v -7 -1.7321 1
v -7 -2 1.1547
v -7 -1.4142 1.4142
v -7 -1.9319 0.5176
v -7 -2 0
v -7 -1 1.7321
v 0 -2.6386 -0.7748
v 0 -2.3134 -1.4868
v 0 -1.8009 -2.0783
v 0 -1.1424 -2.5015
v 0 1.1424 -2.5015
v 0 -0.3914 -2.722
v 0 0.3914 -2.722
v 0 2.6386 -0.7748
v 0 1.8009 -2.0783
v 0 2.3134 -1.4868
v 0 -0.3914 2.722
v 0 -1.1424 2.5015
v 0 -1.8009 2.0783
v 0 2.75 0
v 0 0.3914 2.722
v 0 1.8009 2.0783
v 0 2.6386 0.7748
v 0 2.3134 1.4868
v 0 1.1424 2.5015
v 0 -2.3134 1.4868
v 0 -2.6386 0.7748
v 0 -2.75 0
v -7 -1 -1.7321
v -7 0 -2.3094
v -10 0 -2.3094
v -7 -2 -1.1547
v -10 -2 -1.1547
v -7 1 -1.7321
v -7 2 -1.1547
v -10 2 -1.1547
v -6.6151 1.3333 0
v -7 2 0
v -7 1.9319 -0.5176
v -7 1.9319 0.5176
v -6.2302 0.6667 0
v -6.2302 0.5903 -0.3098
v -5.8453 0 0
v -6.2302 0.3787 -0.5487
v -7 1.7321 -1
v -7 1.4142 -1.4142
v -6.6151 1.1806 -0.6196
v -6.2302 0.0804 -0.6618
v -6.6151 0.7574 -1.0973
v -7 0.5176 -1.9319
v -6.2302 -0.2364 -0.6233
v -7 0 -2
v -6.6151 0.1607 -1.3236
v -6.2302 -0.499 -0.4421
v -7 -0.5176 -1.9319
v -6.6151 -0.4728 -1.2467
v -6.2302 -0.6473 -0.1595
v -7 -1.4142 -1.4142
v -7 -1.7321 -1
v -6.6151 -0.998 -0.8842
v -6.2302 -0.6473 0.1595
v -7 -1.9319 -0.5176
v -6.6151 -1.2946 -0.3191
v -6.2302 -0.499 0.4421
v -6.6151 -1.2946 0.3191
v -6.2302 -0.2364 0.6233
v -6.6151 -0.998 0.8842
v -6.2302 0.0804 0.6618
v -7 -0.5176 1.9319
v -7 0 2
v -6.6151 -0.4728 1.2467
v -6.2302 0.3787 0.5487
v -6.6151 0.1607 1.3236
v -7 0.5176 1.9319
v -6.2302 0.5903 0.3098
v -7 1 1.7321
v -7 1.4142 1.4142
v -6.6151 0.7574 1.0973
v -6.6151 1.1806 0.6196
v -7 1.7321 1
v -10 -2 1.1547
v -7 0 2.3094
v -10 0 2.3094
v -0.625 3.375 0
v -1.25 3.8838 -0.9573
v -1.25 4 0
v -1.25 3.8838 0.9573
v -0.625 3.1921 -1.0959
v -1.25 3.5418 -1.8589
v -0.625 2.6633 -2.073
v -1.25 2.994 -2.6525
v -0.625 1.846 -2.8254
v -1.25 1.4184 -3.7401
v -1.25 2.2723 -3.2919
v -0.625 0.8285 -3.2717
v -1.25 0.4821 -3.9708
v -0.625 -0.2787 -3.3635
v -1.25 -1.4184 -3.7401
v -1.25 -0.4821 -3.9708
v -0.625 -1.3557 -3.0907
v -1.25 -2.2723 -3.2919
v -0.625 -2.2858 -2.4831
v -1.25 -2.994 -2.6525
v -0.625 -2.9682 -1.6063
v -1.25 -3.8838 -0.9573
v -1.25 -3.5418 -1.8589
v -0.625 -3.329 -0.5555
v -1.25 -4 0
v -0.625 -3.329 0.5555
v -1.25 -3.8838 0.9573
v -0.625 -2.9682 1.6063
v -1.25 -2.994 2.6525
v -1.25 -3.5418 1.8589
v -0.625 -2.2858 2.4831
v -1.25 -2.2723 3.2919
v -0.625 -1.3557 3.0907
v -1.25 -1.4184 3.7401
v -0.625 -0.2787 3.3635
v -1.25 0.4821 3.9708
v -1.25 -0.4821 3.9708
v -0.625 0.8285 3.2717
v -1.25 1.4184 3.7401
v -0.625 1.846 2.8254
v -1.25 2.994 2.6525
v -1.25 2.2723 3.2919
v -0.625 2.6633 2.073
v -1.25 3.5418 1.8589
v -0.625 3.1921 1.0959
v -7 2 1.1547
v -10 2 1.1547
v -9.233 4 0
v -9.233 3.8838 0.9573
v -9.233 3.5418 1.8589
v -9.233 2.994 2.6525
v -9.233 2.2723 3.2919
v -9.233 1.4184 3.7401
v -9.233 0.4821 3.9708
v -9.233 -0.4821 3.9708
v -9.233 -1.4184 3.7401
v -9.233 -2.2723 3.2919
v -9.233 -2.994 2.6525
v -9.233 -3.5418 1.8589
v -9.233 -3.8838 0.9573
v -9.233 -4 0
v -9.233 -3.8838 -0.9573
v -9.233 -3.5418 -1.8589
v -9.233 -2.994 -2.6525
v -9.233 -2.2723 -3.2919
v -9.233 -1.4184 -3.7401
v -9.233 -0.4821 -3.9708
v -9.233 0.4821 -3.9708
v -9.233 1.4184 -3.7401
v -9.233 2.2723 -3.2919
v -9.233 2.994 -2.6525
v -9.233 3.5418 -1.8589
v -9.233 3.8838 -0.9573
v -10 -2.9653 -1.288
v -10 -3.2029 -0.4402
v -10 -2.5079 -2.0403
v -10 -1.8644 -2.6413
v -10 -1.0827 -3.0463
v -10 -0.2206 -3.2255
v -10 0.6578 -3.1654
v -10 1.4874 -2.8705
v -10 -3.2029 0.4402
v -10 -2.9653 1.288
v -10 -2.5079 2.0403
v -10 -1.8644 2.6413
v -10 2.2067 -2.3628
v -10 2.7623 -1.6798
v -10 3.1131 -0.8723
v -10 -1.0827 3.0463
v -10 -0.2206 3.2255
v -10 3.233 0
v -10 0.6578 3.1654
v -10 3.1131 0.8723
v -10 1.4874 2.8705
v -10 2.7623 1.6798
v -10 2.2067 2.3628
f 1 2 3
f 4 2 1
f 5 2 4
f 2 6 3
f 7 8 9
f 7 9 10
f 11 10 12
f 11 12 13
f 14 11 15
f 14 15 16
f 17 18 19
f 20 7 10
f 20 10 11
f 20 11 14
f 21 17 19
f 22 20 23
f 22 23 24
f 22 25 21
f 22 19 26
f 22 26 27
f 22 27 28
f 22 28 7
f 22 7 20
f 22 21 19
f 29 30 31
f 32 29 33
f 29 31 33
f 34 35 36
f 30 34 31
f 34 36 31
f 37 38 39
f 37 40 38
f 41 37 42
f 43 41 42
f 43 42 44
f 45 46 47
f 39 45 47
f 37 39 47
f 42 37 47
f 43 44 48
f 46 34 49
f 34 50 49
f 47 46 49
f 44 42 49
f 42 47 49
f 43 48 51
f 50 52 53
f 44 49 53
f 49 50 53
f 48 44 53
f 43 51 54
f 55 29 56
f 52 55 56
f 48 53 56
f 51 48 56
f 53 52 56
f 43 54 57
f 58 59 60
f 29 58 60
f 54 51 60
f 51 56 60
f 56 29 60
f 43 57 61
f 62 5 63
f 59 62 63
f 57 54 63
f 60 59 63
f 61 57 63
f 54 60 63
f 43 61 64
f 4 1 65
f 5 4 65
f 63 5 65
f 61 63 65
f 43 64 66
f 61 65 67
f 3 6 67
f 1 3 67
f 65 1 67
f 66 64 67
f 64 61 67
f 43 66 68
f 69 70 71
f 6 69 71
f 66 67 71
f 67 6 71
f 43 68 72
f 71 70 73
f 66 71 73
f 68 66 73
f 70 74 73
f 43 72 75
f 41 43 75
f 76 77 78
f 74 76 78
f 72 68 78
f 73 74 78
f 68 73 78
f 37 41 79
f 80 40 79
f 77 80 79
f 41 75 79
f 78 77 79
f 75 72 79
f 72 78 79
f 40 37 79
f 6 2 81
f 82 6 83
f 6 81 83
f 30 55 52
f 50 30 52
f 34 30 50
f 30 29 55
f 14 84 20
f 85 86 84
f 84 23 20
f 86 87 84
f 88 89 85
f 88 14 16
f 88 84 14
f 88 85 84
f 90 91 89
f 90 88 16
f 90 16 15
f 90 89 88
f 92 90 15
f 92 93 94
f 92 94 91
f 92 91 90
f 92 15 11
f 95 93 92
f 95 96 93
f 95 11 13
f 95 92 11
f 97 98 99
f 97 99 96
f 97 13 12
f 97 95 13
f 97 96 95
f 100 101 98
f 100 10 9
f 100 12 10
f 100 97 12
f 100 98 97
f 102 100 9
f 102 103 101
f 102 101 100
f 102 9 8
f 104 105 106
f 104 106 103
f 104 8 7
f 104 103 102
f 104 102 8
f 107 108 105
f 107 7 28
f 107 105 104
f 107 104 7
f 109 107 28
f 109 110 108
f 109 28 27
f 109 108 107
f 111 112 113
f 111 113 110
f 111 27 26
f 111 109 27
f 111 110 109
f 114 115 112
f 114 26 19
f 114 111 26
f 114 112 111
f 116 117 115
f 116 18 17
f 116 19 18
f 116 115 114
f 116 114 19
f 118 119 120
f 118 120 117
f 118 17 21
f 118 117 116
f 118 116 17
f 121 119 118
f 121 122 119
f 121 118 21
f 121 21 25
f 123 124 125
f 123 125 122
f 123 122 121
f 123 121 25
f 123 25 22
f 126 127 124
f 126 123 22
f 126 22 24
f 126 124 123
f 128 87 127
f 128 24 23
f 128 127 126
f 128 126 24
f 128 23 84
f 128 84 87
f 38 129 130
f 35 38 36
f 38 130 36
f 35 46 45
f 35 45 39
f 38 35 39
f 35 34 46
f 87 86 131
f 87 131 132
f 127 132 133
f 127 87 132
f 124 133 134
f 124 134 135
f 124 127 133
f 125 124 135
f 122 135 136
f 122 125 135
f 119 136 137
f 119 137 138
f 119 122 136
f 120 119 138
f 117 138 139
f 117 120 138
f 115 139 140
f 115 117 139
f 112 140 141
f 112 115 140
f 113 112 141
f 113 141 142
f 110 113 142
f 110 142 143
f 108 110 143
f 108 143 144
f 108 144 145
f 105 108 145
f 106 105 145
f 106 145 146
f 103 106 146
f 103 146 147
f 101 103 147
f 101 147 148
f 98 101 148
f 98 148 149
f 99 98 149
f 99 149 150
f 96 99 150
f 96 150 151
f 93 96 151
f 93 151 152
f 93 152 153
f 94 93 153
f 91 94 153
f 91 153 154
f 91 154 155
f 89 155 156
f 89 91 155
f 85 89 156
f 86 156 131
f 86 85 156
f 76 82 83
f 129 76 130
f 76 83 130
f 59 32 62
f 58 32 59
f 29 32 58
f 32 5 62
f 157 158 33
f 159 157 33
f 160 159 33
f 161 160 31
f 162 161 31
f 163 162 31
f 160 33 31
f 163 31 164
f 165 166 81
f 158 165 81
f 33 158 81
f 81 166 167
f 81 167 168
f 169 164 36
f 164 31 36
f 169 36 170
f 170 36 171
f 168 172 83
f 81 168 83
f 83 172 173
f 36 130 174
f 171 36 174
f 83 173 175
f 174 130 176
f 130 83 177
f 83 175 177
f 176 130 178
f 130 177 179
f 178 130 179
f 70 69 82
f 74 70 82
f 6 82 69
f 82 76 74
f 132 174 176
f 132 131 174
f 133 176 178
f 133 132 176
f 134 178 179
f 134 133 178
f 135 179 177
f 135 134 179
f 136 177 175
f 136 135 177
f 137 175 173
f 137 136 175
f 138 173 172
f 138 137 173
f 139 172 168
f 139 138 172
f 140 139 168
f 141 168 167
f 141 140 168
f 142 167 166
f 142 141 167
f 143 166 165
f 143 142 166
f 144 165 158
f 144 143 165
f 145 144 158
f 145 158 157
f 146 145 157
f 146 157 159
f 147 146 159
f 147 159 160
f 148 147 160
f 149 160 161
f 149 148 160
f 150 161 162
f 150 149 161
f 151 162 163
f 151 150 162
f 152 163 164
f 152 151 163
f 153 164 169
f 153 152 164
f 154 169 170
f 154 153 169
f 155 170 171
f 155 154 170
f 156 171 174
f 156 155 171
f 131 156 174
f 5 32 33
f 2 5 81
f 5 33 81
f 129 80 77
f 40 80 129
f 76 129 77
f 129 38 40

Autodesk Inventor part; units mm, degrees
sketch "Sketch_1" plane through (0, 0, 0) normal (0, 0, 1) x (1, 0, 0)
  line L0 (0, 0) -> (-10, 0)
  line L1 (-10, 0) -> (-10, 3.233)
  line L2 (-10, 3.233) -> (-9.233, 4)
  line L3 (-9.233, 4) -> (-1.25, 4)
  line L4 (-1.25, 4) -> (0, 2.75)
  line L5 (0, 2.75) -> (0, 0)
  line L6 (0, 0) -> (-10, 0)
revolve "Revolution1" add sketch "Sketch_1" angle 360 about axis through (0, 0, 0) along (1, 0, 0)
thread "Thread1" size "M8x1.25" class "6g" standard "ISO Metric profile" full length
sketch "Sketch_2" plane through (-10, 0, 0) normal (-1, 0, 0) x (0, 1, 0)
  line L0 (-2, -1.1547) -> (0, -2.3094)
  line L1 (0, -2.3094) -> (2, -1.1547)
  line L2 (2, -1.1547) -> (2, 1.1547)
  line L3 (2, 1.1547) -> (0, 2.3094)
  line L4 (0, 2.3094) -> (-2, 1.1547)
  line L5 (-2, 1.1547) -> (-2, -1.1547)
extrude "Extrusion1" cut sketch "Sketch_2" against normal blind 3
sketch "Sketch_3" plane through (0, 0, 0) normal (0, 0, 1) x (1, 0, 0)
  line L0 (-5.8453, 0) -> (-7, 0)
  line L1 (-7, 0) -> (-7, 2)
  line L2 (-7, 2) -> (-5.8453, 0)
  line L3 (-5.8453, 0) -> (-7, 0)
revolve "Revolution2" cut sketch "Sketch_3" angle 360 about axis through (-5.8453, 0, 0) along (1, 0, 0)
ref_plane "CP_XY" through (0, 0, 0) normal (1, 0, 0) x (0, 0, -1)
ref_plane "CP_YZ" through (0, 0, 0) normal (0, 0, -1) x (0, 1, 0)
ref_plane "CP_ZX" through (0, 0, 0) normal (0, 1, 0) x (1, 0, 0)
properties part number "SET-SCREW8-10"
